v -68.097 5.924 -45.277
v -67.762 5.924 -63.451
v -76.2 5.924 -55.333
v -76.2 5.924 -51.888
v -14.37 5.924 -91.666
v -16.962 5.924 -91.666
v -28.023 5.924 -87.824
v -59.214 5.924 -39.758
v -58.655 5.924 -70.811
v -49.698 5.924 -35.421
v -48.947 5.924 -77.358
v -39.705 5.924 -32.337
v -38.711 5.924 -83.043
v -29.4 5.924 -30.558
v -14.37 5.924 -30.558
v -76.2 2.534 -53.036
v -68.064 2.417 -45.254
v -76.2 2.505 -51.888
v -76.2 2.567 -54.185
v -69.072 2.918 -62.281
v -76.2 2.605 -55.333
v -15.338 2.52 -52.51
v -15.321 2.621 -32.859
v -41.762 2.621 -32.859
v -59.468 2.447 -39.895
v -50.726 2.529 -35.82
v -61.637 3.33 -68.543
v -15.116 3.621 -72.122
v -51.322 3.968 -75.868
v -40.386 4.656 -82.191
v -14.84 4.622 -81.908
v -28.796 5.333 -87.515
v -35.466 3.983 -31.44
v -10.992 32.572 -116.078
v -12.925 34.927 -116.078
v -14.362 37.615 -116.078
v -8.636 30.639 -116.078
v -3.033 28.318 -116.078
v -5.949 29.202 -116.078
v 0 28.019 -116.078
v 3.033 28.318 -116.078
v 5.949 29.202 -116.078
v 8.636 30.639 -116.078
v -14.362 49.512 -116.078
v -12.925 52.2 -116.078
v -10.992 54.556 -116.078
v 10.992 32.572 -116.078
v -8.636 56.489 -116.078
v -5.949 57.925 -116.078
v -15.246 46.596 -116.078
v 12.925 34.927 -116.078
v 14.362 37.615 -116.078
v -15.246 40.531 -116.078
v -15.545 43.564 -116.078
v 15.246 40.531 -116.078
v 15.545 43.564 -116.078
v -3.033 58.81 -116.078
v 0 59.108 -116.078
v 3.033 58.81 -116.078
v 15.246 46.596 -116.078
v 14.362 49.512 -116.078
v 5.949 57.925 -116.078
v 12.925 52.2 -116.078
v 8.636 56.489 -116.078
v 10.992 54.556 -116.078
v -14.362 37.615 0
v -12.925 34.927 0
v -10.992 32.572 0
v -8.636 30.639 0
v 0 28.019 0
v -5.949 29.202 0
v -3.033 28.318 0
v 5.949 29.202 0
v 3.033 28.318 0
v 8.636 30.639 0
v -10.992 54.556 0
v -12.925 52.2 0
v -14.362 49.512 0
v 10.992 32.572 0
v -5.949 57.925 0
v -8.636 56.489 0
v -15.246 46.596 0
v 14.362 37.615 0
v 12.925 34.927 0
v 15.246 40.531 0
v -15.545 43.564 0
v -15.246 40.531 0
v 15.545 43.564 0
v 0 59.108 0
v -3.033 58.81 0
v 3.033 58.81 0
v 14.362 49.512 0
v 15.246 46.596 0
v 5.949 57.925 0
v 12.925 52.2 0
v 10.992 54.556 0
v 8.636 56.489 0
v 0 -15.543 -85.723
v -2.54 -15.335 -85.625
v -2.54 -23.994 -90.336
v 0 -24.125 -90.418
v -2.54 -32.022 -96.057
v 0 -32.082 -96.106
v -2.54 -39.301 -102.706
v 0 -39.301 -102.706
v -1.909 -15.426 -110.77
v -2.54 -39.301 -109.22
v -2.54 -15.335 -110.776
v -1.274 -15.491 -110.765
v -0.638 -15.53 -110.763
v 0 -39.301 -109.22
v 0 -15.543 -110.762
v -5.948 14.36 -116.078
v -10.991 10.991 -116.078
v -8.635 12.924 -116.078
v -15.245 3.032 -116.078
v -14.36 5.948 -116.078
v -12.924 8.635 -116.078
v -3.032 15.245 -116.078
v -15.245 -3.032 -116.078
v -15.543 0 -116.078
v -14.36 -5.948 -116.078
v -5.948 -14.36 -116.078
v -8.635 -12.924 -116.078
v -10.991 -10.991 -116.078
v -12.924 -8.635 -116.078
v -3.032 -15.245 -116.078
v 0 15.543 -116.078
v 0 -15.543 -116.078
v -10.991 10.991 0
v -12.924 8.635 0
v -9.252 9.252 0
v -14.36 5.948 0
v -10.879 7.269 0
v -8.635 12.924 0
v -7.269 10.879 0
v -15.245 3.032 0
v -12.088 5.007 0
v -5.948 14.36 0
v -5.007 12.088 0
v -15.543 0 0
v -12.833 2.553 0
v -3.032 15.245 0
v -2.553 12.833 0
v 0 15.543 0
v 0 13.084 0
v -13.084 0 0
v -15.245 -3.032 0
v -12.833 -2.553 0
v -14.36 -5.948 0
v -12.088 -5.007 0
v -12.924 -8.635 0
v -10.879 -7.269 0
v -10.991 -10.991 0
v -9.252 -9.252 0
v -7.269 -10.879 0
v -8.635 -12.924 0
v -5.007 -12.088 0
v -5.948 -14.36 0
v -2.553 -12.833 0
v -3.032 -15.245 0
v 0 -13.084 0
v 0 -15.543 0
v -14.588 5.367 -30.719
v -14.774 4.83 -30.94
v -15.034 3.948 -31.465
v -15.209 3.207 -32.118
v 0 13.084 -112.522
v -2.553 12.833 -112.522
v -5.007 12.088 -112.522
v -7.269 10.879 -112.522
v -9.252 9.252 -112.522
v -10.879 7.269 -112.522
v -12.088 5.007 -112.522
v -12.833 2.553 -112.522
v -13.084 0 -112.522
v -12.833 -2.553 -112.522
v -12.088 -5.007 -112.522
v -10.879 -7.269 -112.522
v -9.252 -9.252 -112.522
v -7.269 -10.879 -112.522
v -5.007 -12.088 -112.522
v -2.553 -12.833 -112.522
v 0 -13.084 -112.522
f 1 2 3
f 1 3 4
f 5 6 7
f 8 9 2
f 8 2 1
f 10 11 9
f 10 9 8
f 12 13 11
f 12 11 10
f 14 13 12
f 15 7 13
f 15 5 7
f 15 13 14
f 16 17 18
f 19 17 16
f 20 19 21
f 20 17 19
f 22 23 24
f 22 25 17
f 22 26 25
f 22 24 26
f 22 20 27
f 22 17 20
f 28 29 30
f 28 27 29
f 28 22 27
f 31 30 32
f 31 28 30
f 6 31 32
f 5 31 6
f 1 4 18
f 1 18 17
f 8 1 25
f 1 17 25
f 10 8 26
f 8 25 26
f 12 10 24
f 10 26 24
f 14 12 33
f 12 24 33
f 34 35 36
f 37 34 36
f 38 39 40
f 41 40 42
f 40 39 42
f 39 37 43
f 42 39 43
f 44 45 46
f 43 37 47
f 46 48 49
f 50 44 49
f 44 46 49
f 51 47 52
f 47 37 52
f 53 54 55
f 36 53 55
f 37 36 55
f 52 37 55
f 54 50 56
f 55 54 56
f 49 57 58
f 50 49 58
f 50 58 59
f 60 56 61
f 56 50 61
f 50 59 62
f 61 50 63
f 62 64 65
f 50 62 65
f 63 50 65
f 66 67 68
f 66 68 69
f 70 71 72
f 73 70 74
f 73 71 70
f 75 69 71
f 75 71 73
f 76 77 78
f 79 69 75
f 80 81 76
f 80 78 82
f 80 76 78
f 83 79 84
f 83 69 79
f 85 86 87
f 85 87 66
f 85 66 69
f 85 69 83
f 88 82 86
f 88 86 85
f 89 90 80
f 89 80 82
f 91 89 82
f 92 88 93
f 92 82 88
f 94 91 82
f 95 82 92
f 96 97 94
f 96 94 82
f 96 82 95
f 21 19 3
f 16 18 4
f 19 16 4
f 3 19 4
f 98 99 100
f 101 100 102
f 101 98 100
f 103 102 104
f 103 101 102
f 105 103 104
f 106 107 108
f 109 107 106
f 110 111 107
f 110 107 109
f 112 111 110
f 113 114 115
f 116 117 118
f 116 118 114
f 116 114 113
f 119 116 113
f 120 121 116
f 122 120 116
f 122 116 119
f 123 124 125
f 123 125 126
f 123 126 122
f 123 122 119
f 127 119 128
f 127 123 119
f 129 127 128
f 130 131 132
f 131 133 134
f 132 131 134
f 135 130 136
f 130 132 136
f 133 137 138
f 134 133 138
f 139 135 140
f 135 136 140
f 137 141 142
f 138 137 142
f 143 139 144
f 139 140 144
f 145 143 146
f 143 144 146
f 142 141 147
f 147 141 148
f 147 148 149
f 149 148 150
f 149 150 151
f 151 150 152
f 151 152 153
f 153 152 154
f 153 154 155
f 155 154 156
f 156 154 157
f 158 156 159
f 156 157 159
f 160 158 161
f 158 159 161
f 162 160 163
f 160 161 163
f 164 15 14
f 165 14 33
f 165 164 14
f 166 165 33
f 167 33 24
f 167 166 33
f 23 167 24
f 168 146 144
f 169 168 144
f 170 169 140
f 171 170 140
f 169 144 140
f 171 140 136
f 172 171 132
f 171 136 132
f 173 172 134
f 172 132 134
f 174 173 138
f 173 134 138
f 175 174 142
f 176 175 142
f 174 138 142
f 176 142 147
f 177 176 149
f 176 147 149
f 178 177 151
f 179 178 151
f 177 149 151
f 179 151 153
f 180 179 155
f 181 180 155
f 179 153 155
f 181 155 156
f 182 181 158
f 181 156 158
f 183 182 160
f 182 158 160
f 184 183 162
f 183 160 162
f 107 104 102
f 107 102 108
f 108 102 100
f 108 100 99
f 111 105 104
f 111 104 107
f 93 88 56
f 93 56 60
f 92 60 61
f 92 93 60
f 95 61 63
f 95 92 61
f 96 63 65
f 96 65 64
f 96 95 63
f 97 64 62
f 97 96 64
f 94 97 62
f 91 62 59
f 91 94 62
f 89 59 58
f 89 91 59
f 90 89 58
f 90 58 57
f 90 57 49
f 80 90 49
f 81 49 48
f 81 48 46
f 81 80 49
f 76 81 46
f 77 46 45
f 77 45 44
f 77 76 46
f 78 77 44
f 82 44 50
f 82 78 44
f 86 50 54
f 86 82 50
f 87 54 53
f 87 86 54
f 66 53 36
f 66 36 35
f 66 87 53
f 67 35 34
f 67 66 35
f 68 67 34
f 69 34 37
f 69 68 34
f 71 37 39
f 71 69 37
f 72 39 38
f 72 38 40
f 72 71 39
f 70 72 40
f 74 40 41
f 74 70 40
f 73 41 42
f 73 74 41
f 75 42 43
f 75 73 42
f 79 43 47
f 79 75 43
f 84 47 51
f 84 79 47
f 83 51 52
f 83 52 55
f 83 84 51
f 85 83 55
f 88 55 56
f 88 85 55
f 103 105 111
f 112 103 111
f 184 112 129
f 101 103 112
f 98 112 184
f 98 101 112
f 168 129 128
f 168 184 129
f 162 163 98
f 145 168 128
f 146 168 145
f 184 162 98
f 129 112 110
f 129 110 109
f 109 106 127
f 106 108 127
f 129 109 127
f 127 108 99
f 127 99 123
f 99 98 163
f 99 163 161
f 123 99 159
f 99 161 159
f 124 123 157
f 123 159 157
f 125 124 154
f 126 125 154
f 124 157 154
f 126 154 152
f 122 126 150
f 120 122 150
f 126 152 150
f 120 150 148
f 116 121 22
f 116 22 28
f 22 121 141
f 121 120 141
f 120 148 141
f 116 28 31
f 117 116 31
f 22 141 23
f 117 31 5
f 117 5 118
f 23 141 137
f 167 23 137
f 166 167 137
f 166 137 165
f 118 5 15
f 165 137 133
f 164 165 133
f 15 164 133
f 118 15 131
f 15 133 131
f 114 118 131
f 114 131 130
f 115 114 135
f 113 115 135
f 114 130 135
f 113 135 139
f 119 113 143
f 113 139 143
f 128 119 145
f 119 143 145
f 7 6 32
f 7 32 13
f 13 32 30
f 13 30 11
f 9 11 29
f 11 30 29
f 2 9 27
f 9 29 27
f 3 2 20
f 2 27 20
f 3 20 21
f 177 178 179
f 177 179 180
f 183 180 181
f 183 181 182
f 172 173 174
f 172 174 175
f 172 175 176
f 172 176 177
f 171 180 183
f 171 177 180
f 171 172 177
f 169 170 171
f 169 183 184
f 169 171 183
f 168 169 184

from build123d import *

# Parameters (mm, degrees)
F2_R          = 15.5434576405
F3_DEPTH      = 116.078
F5_DEPTH      = 2.54
F5_DEPTH_BACK = 2.54
F7_DEPTH      = 76.2
F7_DEPTH_BACK = 76.2
F9_DEPTH      = 72.898
F11_DEPTH     = 25.4
F12_R         = 13.0839369501
F13_DEPTH     = 112.522
F14_W         = 116.2168830633
F14_H         = 197.326593101
F15_DEPTH     = 105.156
F16_R         = 15.5448
F17_DEPTH     = 116.078


# Not quite as in the source:
# - the program builds the solid bodies; features that only make, move or delete a surface that nothing else refers to are left out


with BuildPart() as f3:
    # F2 (on face) → F3 (new body)
    with BuildSketch(Plane(origin=(0, 0, 0), x_dir=(1, 0, 0), z_dir=(0, 0, -1))):
        Circle(F2_R)
    extrude(amount=F3_DEPTH)

    # F4 (on Right) → F5 (join, two sides)
    with BuildSketch(Plane.YZ) as f5_sk:
        with BuildLine():
            Line((-11.3897956908, -111.0316067934), (-11.3897956908, -83.9041918516))
            ThreePointArc((-11.3897956908, -83.9041918516), (-26.3259256593, -91.8493771932), (-39.3006689847, -102.7061715722))
            Line((-39.3006689847, -102.7061715722), (-39.3006689847, -109.2196330428))
            Line((-39.3006689847, -109.2196330428), (-11.3897956908, -111.0316067934))
        make_face()
    extrude(amount=F5_DEPTH)
    extrude(f5_sk.sketch, amount=-F5_DEPTH_BACK)

    # F6 (on Right) → F7 (join, two sides)
    with BuildSketch(Plane.YZ) as f7_sk:
        with BuildLine():
            Line((5.9235603549, -91.6656255722), (5.9235603549, -30.5577199906))
            ThreePointArc((5.9235603549, -30.5577199906), (4.051450151, -31.3912602494), (2.6208171621, -32.8585281968))
            ThreePointArc((2.6208171621, -32.8585281968), (2.92151535, -62.3379338406), (5.9235603549, -91.6656255722))
        make_face()
    extrude(amount=F7_DEPTH)
    extrude(f7_sk.sketch, amount=-F7_DEPTH_BACK)

    # F8 (on Front) → F9 (cut)
    with BuildSketch(Plane.XZ):
        with BuildLine():
            ThreePointArc((-81.6321894526, -57.4373714626), (-51.7546829498, -36.2353974331), (-15.6106846407, -30.2520468831))
            Line((-15.6106846407, -30.2520468831), (-81.6321894526, -24.7040204704))
            Line((-81.6321894526, -24.7040204704), (-81.6321894526, -57.4373714626))
        make_face()
    extrude(amount=-F9_DEPTH, mode=Mode.SUBTRACT)

    # F10 (on Front) → F11 (cut)
    with BuildSketch(Plane.XZ):
        with BuildLine():
            ThreePointArc((-16.4980906993, -91.8035656214), (-49.0002384885, -77.3256808029), (-76.6182541847, -54.8925809562))
            Line((-76.6182541847, -54.8925809562), (-93.9552336931, -110.2590560913))
            Line((-93.9552336931, -110.2590560913), (-16.4980906993, -91.8035656214))
        make_face()
    extrude(amount=-F11_DEPTH, mode=Mode.SUBTRACT)

    # F12 (on Top) → F13 (cut)
    with BuildSketch(Plane.XY):
        Circle(F12_R)
    extrude(amount=-F13_DEPTH, mode=Mode.SUBTRACT)

    # F14 (on Right) → F15 (cut)
    with BuildSketch(Plane.YZ):
        with Locations((-3.3746473491, -56.032512337)):
            Rectangle(F14_W, F14_H)
    extrude(amount=F15_DEPTH, mode=Mode.SUBTRACT)


with BuildPart() as f17:
    # F16 (on Top) → F17 (new body)
    with BuildSketch(Plane.XY):
        with Locations((0, 43.5636749731)):
            Circle(F16_R)
    extrude(amount=-F17_DEPTH)


solid = Compound([f3.part, f17.part])
